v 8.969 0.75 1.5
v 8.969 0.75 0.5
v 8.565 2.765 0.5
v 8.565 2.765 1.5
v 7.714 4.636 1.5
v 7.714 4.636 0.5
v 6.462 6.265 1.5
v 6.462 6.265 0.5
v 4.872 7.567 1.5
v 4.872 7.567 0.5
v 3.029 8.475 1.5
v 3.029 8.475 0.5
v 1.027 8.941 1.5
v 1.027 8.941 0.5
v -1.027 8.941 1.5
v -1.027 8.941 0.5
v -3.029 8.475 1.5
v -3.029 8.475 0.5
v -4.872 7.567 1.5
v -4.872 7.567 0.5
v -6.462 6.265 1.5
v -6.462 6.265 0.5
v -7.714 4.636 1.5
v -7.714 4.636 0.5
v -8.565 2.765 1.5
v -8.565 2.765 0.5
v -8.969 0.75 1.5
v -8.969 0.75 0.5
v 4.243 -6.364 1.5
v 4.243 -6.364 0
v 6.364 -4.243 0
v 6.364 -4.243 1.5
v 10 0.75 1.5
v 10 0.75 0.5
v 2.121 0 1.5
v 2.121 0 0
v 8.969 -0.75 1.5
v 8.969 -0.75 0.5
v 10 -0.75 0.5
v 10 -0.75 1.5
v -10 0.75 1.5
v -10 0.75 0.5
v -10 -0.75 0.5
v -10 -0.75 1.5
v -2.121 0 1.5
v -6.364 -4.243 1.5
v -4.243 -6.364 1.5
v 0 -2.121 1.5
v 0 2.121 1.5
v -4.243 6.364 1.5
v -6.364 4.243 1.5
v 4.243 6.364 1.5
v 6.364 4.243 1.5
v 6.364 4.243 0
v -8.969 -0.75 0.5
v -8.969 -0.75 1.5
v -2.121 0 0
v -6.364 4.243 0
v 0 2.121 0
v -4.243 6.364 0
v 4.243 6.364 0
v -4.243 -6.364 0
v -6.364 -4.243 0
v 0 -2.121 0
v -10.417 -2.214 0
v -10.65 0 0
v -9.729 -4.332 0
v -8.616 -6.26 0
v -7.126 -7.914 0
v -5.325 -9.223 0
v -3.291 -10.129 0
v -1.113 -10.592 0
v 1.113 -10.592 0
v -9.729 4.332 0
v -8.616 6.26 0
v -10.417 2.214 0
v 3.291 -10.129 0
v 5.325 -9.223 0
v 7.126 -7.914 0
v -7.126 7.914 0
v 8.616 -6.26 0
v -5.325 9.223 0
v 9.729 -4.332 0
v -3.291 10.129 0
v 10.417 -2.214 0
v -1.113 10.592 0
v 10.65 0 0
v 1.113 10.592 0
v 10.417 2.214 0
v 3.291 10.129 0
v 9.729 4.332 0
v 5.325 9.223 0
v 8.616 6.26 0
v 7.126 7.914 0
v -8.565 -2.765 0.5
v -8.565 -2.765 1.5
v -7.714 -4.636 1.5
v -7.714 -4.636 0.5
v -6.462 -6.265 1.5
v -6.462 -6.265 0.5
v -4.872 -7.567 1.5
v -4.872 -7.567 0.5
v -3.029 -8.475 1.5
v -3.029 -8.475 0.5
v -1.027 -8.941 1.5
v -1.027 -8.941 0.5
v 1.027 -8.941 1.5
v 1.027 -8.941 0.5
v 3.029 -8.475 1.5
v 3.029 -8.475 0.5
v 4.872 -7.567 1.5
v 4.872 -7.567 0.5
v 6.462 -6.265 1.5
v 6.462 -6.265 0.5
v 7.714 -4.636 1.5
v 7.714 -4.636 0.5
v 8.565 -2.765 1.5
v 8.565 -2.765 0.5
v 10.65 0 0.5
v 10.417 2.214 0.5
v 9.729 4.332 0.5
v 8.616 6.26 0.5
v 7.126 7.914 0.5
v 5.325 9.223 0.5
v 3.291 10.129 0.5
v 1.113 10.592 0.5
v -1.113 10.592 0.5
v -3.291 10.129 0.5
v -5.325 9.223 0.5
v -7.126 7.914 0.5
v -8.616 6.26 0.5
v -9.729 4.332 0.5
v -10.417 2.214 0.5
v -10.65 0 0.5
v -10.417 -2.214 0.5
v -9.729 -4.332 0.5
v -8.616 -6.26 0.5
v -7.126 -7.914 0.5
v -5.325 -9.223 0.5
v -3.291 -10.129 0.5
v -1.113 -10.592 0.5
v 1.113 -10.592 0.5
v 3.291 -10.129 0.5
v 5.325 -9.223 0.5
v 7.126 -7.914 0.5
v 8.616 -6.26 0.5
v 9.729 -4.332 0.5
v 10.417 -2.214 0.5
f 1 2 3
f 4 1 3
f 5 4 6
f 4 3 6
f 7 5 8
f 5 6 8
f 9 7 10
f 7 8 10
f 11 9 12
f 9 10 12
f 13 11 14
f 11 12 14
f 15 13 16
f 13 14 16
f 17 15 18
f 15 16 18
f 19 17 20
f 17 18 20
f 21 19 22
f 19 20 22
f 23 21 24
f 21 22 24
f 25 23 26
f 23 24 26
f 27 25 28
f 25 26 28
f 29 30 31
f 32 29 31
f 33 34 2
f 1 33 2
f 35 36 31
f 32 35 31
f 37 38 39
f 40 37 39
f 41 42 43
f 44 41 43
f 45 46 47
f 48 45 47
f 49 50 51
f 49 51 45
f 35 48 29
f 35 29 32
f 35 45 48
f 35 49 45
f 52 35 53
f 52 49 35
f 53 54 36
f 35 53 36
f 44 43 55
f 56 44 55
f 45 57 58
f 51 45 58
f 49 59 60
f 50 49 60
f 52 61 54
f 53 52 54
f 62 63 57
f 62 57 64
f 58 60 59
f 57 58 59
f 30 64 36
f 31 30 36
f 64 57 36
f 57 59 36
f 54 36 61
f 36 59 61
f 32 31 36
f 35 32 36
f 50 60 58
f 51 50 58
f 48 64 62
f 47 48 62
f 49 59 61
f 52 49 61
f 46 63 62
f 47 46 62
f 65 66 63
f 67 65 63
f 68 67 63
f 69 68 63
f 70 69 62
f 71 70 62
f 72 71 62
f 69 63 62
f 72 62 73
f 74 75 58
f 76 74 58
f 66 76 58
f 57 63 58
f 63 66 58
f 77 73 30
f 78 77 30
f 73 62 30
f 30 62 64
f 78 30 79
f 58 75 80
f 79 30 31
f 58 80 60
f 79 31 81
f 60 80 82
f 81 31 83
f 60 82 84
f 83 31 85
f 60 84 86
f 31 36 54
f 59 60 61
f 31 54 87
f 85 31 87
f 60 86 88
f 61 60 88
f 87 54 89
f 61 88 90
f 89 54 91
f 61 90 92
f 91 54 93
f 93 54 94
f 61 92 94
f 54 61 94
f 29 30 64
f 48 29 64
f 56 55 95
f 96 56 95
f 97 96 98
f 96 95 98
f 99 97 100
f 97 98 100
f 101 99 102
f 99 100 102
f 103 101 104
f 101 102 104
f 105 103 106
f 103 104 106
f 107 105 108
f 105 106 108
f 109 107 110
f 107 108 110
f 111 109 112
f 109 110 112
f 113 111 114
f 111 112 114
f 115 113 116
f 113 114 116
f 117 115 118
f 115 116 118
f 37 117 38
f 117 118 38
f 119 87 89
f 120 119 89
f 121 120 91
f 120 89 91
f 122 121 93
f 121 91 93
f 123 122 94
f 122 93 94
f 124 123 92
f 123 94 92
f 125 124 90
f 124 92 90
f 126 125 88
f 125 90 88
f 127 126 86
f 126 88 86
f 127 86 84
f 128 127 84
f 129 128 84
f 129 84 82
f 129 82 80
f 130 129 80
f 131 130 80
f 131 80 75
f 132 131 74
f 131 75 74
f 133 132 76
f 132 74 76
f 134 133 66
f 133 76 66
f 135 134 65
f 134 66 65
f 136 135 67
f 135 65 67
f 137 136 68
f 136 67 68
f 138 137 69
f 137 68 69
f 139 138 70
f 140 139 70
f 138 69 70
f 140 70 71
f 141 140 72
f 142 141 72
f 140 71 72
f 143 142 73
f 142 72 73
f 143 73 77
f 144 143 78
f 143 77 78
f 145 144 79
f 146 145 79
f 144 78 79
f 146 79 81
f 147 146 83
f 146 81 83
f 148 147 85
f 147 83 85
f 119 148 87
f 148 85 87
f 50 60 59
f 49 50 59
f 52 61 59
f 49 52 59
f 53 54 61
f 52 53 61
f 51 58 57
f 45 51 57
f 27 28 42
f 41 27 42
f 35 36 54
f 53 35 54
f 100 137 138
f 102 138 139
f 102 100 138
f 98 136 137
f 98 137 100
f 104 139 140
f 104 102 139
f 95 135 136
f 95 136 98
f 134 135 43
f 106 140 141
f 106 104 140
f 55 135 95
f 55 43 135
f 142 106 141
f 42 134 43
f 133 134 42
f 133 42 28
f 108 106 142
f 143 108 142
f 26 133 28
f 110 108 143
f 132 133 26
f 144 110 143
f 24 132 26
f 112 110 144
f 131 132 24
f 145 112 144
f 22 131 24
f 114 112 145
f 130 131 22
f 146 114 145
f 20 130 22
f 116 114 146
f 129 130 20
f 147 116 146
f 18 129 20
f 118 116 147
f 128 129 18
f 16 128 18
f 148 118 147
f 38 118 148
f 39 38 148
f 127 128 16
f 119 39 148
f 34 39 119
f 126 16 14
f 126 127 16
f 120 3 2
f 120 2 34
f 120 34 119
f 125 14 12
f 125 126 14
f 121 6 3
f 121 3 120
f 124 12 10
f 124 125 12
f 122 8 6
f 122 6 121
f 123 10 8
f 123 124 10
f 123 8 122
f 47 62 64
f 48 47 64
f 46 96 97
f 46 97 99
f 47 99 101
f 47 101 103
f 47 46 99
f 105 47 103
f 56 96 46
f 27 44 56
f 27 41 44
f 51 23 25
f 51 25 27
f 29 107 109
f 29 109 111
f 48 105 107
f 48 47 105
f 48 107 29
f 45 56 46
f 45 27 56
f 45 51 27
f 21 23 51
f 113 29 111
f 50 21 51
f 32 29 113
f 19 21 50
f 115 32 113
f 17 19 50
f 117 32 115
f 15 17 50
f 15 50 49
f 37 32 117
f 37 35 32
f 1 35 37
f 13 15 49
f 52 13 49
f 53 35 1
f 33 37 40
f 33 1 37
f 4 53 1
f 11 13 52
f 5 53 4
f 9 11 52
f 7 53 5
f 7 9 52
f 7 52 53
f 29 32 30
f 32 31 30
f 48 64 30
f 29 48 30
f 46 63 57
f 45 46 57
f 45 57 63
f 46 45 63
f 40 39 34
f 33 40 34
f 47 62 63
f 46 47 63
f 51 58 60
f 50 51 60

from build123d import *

# Parameters (mm, degrees)
F0_R     = 10.65
F1_DEPTH = 0.5
F3_DEPTH = 1
F4_DEPTH = 1.5


with BuildPart() as f1:
    # F0 (on Top) → F1 (new body)
    with BuildSketch(Plane.XY):
        Circle(F0_R)
        Polygon((-4.2426406871, -6.3639610307), (-6.3639610307, -4.2426406871), (-2.1213203436, 0), (-6.3639610307, 4.2426406871), (-4.2426406871, 6.3639610307), (0, 2.1213203436), (4.2426406871, 6.3639610307), (6.3639610307, 4.2426406871), (2.1213203436, 0), (6.3639610307, -4.2426406871), (4.2426406871, -6.3639610307), (0, -2.1213203436), align=None, mode=Mode.SUBTRACT)
    extrude(amount=F1_DEPTH)

    # F2 (on face) → F3 (join)
    with BuildSketch(Plane.XY.offset(0.5)):
        with BuildLine():
            Line((-10, -0.75), (-8.9686955573, -0.75))
            ThreePointArc((-8.9686955573, -0.75), (0, -9), (8.9686955573, -0.75))
            Line((8.9686955573, -0.75), (10, -0.75))
            Line((10, -0.75), (10, 0.75))
            Line((10, 0.75), (8.9686955573, 0.75))
            ThreePointArc((8.9686955573, 0.75), (0, 9), (-8.9686955573, 0.75))
            Line((-8.9686955573, 0.75), (-10, 0.75))
            Line((-10, 0.75), (-10, -0.75))
        make_face()
        Polygon((6.3639610307, -4.2426406871), (4.2426406871, -6.3639610307), (0, -2.1213203436), (-4.2426406871, -6.3639610307), (-6.3639610307, -4.2426406871), (-2.1213203436, 0), (-6.3639610307, 4.2426406871), (-4.2426406871, 6.3639610307), (0, 2.1213203436), (4.2426406871, 6.3639610307), (6.3639610307, 4.2426406871), (2.1213203436, 0), align=None, mode=Mode.SUBTRACT)
    extrude(amount=F3_DEPTH)


with BuildPart() as f4:
    # F0 (on Top) → F4 (new body, through all)
    with BuildSketch(Plane.XY):
        Polygon((-2.1213203436, 0), (-6.3639610307, -4.2426406871), (-4.2426406871, -6.3639610307), (0, -2.1213203436), (4.2426406871, -6.3639610307), (6.3639610307, -4.2426406871), (2.1213203436, 0), (6.3639610307, 4.2426406871), (4.2426406871, 6.3639610307), (0, 2.1213203436), (-4.2426406871, 6.3639610307), (-6.3639610307, 4.2426406871), align=None)
    extrude(amount=F4_DEPTH)


solid = Compound([f1.part, f4.part])
